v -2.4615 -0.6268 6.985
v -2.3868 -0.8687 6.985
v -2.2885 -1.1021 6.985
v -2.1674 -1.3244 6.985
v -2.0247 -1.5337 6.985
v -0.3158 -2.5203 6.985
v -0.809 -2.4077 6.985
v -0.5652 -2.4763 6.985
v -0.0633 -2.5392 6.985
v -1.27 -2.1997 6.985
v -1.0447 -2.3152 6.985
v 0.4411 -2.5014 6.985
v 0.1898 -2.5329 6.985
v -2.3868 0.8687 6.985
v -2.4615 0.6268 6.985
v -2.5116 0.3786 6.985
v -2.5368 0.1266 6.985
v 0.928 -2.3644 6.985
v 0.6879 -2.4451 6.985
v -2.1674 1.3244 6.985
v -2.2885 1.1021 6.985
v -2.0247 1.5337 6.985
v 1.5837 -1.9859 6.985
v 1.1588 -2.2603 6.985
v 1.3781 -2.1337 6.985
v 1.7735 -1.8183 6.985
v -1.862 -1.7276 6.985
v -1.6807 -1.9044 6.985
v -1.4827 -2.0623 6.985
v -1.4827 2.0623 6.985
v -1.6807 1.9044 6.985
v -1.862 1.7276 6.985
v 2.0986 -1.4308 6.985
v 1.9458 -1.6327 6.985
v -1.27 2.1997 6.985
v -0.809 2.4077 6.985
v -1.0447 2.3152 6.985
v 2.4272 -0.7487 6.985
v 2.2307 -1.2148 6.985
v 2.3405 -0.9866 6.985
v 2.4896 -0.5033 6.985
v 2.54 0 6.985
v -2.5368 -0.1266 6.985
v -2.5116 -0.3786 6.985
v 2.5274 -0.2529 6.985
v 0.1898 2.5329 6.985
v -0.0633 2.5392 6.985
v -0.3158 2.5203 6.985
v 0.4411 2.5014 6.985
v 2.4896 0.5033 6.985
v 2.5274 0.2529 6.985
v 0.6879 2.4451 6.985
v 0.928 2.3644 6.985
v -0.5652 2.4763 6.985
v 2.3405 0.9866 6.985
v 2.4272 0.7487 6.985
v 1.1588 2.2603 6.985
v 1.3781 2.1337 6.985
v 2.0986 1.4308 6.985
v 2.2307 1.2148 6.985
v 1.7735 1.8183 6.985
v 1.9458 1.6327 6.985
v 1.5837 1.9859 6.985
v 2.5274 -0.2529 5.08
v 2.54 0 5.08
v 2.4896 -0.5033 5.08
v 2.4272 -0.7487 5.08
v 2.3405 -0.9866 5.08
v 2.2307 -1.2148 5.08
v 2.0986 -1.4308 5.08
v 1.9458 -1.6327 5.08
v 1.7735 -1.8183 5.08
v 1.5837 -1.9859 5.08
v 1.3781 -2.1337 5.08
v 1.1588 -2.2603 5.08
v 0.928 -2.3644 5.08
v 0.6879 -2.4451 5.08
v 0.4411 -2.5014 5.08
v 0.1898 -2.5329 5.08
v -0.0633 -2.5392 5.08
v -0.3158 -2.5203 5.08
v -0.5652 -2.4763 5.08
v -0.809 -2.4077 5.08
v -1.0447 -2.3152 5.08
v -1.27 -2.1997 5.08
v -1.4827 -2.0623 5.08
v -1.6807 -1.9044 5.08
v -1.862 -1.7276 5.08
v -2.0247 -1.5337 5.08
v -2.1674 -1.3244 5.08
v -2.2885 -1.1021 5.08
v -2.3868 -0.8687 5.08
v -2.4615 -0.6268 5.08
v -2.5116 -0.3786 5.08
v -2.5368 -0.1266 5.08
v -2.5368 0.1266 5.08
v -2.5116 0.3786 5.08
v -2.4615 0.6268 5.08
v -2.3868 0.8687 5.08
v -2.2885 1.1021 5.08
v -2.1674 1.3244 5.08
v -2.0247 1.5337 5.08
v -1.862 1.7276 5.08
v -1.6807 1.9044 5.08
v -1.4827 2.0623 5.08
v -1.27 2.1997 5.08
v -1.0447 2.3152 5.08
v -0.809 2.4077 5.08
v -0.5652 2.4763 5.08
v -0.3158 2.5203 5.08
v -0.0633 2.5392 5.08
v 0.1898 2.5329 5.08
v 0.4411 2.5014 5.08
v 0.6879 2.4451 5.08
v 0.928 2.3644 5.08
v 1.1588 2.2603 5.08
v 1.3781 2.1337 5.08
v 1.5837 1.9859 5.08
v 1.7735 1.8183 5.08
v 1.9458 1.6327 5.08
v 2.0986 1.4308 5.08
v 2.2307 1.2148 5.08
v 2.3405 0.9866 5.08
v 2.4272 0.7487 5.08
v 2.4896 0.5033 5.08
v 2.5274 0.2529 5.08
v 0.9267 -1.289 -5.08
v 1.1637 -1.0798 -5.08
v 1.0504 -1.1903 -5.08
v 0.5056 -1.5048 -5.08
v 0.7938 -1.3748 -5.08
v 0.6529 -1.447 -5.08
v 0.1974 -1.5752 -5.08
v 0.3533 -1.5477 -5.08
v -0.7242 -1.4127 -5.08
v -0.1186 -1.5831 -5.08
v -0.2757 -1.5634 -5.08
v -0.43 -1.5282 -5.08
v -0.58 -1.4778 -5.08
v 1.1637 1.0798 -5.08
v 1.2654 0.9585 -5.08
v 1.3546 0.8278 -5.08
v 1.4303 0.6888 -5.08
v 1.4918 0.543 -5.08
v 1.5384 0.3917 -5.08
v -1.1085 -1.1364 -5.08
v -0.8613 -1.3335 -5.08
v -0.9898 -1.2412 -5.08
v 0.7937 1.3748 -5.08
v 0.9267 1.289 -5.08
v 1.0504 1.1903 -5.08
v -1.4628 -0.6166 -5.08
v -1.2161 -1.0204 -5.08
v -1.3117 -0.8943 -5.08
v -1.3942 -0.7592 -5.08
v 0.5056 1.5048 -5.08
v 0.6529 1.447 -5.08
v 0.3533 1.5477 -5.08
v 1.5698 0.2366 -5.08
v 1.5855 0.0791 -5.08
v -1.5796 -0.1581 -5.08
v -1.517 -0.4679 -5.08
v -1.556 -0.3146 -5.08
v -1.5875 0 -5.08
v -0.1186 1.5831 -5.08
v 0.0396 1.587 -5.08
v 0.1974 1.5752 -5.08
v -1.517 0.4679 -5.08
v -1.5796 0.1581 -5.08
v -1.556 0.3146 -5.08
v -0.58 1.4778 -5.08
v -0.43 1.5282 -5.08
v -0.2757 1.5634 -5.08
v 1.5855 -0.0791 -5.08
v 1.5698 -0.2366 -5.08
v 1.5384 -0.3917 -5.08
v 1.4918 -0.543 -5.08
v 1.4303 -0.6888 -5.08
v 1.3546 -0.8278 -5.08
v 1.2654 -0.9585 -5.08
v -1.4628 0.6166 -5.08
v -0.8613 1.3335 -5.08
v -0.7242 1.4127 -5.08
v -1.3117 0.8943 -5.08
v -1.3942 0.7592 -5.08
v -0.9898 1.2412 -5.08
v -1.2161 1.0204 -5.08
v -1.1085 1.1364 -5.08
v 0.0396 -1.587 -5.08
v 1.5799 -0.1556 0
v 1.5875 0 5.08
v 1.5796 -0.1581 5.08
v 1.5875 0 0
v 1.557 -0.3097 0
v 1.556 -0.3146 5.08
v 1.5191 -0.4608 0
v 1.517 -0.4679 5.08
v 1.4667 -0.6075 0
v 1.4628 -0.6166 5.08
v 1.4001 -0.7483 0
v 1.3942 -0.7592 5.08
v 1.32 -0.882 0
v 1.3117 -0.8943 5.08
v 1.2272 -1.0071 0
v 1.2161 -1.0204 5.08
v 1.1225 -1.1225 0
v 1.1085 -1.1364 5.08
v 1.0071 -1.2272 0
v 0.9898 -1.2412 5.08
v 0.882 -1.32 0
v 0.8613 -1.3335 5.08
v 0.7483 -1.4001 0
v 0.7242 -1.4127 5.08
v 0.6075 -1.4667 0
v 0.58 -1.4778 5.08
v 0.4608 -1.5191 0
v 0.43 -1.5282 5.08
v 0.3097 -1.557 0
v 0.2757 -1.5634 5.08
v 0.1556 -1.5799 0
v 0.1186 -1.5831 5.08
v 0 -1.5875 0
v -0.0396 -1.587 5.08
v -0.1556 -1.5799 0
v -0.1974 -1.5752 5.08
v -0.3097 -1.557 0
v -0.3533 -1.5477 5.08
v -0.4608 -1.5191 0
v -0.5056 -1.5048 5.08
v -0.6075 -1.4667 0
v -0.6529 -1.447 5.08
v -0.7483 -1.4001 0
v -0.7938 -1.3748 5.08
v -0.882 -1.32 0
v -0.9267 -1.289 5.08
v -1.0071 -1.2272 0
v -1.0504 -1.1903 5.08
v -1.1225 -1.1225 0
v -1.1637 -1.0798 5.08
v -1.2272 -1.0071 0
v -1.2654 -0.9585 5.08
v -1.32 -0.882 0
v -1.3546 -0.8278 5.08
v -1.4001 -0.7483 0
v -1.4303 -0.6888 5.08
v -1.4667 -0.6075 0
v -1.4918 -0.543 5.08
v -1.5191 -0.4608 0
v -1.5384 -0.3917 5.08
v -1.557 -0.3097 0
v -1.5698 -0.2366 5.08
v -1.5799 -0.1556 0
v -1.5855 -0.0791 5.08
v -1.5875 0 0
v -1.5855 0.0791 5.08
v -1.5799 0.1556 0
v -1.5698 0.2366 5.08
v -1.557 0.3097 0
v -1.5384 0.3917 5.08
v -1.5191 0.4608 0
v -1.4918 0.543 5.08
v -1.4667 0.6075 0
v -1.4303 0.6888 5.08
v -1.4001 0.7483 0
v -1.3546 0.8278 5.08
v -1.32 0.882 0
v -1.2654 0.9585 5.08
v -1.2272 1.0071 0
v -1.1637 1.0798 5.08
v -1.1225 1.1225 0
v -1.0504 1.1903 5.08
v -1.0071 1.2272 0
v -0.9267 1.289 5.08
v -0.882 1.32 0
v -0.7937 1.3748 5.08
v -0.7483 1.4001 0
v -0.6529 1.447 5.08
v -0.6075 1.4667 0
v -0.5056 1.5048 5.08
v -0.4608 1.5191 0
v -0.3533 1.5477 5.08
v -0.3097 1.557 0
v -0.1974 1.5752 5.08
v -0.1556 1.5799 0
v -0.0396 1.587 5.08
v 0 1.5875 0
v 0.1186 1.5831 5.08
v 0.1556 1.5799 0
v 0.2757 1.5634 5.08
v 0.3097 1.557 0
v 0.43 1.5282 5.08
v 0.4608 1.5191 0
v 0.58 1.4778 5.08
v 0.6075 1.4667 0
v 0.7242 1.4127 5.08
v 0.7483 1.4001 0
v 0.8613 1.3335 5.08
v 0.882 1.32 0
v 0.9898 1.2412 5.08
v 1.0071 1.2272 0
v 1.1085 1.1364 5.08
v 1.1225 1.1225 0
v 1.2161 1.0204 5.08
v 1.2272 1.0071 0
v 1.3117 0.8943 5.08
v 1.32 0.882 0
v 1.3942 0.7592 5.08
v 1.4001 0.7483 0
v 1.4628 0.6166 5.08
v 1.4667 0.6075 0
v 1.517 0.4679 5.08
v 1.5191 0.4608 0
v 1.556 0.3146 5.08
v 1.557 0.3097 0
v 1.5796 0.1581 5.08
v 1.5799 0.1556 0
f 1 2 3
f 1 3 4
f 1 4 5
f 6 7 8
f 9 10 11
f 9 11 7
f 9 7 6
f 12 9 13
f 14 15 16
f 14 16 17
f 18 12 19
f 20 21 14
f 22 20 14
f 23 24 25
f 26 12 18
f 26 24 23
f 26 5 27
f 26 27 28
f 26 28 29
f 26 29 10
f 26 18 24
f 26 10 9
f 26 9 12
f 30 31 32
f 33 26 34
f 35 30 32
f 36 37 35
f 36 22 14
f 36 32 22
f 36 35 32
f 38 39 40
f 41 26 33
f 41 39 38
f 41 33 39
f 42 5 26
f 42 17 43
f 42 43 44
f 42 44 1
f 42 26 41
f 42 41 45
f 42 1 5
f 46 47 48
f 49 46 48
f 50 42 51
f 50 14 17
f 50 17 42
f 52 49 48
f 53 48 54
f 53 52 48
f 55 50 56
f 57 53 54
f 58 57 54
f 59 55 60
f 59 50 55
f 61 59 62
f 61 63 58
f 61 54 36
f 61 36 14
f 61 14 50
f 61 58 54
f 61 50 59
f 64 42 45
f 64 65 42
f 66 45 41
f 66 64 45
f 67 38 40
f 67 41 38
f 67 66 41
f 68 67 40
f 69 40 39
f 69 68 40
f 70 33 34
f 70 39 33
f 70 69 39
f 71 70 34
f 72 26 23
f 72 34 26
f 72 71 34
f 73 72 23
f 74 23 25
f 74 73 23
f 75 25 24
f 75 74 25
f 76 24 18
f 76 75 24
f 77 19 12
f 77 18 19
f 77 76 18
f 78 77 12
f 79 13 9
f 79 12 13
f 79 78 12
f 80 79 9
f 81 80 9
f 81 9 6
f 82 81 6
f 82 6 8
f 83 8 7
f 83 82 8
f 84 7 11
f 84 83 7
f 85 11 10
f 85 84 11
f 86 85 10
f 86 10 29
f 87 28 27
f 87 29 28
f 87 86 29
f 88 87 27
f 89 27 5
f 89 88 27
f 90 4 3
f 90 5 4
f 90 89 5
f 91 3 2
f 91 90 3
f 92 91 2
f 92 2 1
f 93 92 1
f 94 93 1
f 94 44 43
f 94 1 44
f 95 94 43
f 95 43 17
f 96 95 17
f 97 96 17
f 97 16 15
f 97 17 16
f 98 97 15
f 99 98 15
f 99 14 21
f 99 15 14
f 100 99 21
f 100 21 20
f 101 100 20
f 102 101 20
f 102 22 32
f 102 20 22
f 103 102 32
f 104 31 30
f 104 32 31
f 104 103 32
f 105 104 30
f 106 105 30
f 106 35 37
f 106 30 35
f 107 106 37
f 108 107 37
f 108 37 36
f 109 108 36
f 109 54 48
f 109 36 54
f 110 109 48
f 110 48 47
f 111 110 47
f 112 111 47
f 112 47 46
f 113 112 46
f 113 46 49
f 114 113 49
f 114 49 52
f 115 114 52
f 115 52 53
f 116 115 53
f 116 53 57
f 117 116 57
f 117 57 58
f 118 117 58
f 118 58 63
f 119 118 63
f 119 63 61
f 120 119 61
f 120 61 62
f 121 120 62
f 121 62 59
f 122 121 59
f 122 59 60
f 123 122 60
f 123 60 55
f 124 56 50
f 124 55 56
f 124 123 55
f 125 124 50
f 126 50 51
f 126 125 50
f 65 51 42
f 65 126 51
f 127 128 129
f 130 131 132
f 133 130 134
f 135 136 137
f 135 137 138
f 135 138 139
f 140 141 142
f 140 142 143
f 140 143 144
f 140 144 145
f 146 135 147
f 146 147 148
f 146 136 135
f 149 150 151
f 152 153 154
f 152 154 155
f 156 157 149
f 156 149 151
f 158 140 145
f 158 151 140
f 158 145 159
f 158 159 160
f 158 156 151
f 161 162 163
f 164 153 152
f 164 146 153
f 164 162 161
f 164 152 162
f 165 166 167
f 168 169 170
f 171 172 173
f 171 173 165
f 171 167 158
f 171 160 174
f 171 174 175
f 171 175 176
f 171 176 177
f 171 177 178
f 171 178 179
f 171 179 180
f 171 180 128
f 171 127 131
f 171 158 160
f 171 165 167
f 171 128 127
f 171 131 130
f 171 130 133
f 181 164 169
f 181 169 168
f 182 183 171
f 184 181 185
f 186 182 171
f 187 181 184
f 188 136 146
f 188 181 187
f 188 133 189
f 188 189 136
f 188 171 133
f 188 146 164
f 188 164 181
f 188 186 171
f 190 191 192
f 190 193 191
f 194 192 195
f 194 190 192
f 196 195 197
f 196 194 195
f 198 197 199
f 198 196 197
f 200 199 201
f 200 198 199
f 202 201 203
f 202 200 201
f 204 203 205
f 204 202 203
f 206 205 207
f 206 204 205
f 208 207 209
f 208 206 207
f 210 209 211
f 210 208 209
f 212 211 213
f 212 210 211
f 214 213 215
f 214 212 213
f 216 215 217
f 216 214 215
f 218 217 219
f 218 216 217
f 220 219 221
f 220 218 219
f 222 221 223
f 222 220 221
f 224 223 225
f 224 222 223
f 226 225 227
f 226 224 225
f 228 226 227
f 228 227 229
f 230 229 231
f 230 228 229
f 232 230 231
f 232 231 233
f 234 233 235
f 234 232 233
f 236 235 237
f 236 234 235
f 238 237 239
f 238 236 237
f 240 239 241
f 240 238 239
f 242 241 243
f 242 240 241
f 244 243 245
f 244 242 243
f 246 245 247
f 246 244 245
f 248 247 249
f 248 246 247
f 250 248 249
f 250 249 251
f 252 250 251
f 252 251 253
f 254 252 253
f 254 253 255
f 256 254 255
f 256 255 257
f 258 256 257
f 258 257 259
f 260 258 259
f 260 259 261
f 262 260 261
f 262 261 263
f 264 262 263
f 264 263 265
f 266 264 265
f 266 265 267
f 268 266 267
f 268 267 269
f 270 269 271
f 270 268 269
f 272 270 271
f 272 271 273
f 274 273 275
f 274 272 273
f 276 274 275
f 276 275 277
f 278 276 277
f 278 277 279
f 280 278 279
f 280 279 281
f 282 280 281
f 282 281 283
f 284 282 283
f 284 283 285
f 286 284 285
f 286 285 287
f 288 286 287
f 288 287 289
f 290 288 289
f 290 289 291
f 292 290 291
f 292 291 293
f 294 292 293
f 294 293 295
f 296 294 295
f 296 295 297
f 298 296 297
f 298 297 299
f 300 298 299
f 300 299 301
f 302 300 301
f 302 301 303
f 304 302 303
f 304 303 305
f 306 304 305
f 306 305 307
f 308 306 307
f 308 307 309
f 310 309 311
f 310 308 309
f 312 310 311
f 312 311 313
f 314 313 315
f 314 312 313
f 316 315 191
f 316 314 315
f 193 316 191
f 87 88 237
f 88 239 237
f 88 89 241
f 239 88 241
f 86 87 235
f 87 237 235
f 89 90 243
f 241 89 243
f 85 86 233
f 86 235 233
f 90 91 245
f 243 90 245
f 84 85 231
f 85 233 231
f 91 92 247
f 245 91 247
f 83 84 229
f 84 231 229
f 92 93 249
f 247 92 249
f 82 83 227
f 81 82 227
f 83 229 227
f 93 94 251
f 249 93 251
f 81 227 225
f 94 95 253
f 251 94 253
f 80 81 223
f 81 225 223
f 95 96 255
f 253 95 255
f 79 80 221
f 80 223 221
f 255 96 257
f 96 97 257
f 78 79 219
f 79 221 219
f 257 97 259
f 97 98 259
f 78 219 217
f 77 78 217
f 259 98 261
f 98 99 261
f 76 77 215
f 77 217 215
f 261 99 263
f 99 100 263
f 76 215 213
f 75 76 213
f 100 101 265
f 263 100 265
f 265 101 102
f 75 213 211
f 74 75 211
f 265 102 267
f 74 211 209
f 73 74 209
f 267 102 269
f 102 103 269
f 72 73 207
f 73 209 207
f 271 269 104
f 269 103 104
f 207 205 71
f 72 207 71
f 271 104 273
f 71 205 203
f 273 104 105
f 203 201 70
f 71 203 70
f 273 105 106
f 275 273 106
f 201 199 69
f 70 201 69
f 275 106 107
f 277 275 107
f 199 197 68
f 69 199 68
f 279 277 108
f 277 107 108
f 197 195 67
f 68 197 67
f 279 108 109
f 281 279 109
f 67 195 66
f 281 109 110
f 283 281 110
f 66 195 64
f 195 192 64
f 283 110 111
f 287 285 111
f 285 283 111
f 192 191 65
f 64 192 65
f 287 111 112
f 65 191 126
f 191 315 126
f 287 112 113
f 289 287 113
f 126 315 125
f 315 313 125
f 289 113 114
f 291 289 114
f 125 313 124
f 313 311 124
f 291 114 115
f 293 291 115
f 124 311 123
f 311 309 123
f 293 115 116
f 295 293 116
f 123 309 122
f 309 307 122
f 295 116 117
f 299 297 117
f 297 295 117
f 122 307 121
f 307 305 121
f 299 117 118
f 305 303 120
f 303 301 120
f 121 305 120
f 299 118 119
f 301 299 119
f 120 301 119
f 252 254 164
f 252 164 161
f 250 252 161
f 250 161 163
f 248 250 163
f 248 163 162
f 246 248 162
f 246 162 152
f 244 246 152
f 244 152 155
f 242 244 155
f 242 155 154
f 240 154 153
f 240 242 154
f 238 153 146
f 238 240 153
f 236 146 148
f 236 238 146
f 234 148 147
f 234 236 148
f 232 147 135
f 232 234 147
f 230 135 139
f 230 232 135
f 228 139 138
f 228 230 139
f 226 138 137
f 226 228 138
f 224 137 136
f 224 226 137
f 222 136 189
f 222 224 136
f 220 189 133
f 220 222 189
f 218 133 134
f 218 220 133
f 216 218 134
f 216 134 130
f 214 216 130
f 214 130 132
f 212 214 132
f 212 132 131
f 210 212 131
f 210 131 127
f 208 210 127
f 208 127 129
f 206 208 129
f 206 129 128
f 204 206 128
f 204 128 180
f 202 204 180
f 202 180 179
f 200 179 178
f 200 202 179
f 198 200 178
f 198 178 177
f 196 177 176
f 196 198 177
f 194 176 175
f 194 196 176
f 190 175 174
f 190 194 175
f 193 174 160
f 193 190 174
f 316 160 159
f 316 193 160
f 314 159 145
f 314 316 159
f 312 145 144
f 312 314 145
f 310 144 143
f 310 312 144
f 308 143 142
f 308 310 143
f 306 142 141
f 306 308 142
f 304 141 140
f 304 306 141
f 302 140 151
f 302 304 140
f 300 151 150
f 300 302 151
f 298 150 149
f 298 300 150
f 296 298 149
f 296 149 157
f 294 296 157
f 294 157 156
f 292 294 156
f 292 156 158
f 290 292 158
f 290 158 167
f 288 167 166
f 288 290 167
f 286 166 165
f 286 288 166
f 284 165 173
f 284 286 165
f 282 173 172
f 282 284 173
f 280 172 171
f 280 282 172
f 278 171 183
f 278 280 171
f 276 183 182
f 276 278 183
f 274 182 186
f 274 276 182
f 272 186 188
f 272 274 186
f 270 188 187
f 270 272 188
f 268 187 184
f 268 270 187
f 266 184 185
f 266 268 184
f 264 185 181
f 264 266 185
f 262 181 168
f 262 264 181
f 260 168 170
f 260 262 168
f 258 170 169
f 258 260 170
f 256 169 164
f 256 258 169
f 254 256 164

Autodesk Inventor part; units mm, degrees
ref_plane "YZ Plane" through (0, 0, 0) normal (1, 0, 0) x (0, 1, 0)
ref_plane "XZ Plane" through (0, 0, 0) normal (0, 1, 0) x (-1, 0, 0)
ref_plane "XY Plane" through (0, 0, 0) normal (0, 0, 1) x (1, 0, 0)
sketch "Sketch1" plane through (0, 0, 0) normal (0, 0, 1) x (1, 0, 0)
  circle A0 centre (0, 0) radius 1.5875
  dimension "d0" = 3.175
extrude "Extrusion1" add sketch "Sketch1" along normal blind 5.08
sketch "Sketch2" plane through (0, 0, 5.08) normal (0, 0, 1) x (1, 0, 0)
  circle A0 centre (0, 0) radius 2.54
  dimension "d3" = 5.08
extrude "Extrusion2" add sketch "Sketch2" along normal blind 1.905
thread "Thread1" size "5-40 UNC" class "2A" standard "ANSI Unified Screw Threads" full length
sketch "Sketch3" plane through (0, 0, 0) normal (0, 0, -1) x (-1, 0, 0)
  circle A0 centre (0, 0) radius 1.5875
extrude "Extrusion3" add sketch "Sketch3" along normal blind 5.08
properties part number "ScrewLong" material "Stainless Steel"
